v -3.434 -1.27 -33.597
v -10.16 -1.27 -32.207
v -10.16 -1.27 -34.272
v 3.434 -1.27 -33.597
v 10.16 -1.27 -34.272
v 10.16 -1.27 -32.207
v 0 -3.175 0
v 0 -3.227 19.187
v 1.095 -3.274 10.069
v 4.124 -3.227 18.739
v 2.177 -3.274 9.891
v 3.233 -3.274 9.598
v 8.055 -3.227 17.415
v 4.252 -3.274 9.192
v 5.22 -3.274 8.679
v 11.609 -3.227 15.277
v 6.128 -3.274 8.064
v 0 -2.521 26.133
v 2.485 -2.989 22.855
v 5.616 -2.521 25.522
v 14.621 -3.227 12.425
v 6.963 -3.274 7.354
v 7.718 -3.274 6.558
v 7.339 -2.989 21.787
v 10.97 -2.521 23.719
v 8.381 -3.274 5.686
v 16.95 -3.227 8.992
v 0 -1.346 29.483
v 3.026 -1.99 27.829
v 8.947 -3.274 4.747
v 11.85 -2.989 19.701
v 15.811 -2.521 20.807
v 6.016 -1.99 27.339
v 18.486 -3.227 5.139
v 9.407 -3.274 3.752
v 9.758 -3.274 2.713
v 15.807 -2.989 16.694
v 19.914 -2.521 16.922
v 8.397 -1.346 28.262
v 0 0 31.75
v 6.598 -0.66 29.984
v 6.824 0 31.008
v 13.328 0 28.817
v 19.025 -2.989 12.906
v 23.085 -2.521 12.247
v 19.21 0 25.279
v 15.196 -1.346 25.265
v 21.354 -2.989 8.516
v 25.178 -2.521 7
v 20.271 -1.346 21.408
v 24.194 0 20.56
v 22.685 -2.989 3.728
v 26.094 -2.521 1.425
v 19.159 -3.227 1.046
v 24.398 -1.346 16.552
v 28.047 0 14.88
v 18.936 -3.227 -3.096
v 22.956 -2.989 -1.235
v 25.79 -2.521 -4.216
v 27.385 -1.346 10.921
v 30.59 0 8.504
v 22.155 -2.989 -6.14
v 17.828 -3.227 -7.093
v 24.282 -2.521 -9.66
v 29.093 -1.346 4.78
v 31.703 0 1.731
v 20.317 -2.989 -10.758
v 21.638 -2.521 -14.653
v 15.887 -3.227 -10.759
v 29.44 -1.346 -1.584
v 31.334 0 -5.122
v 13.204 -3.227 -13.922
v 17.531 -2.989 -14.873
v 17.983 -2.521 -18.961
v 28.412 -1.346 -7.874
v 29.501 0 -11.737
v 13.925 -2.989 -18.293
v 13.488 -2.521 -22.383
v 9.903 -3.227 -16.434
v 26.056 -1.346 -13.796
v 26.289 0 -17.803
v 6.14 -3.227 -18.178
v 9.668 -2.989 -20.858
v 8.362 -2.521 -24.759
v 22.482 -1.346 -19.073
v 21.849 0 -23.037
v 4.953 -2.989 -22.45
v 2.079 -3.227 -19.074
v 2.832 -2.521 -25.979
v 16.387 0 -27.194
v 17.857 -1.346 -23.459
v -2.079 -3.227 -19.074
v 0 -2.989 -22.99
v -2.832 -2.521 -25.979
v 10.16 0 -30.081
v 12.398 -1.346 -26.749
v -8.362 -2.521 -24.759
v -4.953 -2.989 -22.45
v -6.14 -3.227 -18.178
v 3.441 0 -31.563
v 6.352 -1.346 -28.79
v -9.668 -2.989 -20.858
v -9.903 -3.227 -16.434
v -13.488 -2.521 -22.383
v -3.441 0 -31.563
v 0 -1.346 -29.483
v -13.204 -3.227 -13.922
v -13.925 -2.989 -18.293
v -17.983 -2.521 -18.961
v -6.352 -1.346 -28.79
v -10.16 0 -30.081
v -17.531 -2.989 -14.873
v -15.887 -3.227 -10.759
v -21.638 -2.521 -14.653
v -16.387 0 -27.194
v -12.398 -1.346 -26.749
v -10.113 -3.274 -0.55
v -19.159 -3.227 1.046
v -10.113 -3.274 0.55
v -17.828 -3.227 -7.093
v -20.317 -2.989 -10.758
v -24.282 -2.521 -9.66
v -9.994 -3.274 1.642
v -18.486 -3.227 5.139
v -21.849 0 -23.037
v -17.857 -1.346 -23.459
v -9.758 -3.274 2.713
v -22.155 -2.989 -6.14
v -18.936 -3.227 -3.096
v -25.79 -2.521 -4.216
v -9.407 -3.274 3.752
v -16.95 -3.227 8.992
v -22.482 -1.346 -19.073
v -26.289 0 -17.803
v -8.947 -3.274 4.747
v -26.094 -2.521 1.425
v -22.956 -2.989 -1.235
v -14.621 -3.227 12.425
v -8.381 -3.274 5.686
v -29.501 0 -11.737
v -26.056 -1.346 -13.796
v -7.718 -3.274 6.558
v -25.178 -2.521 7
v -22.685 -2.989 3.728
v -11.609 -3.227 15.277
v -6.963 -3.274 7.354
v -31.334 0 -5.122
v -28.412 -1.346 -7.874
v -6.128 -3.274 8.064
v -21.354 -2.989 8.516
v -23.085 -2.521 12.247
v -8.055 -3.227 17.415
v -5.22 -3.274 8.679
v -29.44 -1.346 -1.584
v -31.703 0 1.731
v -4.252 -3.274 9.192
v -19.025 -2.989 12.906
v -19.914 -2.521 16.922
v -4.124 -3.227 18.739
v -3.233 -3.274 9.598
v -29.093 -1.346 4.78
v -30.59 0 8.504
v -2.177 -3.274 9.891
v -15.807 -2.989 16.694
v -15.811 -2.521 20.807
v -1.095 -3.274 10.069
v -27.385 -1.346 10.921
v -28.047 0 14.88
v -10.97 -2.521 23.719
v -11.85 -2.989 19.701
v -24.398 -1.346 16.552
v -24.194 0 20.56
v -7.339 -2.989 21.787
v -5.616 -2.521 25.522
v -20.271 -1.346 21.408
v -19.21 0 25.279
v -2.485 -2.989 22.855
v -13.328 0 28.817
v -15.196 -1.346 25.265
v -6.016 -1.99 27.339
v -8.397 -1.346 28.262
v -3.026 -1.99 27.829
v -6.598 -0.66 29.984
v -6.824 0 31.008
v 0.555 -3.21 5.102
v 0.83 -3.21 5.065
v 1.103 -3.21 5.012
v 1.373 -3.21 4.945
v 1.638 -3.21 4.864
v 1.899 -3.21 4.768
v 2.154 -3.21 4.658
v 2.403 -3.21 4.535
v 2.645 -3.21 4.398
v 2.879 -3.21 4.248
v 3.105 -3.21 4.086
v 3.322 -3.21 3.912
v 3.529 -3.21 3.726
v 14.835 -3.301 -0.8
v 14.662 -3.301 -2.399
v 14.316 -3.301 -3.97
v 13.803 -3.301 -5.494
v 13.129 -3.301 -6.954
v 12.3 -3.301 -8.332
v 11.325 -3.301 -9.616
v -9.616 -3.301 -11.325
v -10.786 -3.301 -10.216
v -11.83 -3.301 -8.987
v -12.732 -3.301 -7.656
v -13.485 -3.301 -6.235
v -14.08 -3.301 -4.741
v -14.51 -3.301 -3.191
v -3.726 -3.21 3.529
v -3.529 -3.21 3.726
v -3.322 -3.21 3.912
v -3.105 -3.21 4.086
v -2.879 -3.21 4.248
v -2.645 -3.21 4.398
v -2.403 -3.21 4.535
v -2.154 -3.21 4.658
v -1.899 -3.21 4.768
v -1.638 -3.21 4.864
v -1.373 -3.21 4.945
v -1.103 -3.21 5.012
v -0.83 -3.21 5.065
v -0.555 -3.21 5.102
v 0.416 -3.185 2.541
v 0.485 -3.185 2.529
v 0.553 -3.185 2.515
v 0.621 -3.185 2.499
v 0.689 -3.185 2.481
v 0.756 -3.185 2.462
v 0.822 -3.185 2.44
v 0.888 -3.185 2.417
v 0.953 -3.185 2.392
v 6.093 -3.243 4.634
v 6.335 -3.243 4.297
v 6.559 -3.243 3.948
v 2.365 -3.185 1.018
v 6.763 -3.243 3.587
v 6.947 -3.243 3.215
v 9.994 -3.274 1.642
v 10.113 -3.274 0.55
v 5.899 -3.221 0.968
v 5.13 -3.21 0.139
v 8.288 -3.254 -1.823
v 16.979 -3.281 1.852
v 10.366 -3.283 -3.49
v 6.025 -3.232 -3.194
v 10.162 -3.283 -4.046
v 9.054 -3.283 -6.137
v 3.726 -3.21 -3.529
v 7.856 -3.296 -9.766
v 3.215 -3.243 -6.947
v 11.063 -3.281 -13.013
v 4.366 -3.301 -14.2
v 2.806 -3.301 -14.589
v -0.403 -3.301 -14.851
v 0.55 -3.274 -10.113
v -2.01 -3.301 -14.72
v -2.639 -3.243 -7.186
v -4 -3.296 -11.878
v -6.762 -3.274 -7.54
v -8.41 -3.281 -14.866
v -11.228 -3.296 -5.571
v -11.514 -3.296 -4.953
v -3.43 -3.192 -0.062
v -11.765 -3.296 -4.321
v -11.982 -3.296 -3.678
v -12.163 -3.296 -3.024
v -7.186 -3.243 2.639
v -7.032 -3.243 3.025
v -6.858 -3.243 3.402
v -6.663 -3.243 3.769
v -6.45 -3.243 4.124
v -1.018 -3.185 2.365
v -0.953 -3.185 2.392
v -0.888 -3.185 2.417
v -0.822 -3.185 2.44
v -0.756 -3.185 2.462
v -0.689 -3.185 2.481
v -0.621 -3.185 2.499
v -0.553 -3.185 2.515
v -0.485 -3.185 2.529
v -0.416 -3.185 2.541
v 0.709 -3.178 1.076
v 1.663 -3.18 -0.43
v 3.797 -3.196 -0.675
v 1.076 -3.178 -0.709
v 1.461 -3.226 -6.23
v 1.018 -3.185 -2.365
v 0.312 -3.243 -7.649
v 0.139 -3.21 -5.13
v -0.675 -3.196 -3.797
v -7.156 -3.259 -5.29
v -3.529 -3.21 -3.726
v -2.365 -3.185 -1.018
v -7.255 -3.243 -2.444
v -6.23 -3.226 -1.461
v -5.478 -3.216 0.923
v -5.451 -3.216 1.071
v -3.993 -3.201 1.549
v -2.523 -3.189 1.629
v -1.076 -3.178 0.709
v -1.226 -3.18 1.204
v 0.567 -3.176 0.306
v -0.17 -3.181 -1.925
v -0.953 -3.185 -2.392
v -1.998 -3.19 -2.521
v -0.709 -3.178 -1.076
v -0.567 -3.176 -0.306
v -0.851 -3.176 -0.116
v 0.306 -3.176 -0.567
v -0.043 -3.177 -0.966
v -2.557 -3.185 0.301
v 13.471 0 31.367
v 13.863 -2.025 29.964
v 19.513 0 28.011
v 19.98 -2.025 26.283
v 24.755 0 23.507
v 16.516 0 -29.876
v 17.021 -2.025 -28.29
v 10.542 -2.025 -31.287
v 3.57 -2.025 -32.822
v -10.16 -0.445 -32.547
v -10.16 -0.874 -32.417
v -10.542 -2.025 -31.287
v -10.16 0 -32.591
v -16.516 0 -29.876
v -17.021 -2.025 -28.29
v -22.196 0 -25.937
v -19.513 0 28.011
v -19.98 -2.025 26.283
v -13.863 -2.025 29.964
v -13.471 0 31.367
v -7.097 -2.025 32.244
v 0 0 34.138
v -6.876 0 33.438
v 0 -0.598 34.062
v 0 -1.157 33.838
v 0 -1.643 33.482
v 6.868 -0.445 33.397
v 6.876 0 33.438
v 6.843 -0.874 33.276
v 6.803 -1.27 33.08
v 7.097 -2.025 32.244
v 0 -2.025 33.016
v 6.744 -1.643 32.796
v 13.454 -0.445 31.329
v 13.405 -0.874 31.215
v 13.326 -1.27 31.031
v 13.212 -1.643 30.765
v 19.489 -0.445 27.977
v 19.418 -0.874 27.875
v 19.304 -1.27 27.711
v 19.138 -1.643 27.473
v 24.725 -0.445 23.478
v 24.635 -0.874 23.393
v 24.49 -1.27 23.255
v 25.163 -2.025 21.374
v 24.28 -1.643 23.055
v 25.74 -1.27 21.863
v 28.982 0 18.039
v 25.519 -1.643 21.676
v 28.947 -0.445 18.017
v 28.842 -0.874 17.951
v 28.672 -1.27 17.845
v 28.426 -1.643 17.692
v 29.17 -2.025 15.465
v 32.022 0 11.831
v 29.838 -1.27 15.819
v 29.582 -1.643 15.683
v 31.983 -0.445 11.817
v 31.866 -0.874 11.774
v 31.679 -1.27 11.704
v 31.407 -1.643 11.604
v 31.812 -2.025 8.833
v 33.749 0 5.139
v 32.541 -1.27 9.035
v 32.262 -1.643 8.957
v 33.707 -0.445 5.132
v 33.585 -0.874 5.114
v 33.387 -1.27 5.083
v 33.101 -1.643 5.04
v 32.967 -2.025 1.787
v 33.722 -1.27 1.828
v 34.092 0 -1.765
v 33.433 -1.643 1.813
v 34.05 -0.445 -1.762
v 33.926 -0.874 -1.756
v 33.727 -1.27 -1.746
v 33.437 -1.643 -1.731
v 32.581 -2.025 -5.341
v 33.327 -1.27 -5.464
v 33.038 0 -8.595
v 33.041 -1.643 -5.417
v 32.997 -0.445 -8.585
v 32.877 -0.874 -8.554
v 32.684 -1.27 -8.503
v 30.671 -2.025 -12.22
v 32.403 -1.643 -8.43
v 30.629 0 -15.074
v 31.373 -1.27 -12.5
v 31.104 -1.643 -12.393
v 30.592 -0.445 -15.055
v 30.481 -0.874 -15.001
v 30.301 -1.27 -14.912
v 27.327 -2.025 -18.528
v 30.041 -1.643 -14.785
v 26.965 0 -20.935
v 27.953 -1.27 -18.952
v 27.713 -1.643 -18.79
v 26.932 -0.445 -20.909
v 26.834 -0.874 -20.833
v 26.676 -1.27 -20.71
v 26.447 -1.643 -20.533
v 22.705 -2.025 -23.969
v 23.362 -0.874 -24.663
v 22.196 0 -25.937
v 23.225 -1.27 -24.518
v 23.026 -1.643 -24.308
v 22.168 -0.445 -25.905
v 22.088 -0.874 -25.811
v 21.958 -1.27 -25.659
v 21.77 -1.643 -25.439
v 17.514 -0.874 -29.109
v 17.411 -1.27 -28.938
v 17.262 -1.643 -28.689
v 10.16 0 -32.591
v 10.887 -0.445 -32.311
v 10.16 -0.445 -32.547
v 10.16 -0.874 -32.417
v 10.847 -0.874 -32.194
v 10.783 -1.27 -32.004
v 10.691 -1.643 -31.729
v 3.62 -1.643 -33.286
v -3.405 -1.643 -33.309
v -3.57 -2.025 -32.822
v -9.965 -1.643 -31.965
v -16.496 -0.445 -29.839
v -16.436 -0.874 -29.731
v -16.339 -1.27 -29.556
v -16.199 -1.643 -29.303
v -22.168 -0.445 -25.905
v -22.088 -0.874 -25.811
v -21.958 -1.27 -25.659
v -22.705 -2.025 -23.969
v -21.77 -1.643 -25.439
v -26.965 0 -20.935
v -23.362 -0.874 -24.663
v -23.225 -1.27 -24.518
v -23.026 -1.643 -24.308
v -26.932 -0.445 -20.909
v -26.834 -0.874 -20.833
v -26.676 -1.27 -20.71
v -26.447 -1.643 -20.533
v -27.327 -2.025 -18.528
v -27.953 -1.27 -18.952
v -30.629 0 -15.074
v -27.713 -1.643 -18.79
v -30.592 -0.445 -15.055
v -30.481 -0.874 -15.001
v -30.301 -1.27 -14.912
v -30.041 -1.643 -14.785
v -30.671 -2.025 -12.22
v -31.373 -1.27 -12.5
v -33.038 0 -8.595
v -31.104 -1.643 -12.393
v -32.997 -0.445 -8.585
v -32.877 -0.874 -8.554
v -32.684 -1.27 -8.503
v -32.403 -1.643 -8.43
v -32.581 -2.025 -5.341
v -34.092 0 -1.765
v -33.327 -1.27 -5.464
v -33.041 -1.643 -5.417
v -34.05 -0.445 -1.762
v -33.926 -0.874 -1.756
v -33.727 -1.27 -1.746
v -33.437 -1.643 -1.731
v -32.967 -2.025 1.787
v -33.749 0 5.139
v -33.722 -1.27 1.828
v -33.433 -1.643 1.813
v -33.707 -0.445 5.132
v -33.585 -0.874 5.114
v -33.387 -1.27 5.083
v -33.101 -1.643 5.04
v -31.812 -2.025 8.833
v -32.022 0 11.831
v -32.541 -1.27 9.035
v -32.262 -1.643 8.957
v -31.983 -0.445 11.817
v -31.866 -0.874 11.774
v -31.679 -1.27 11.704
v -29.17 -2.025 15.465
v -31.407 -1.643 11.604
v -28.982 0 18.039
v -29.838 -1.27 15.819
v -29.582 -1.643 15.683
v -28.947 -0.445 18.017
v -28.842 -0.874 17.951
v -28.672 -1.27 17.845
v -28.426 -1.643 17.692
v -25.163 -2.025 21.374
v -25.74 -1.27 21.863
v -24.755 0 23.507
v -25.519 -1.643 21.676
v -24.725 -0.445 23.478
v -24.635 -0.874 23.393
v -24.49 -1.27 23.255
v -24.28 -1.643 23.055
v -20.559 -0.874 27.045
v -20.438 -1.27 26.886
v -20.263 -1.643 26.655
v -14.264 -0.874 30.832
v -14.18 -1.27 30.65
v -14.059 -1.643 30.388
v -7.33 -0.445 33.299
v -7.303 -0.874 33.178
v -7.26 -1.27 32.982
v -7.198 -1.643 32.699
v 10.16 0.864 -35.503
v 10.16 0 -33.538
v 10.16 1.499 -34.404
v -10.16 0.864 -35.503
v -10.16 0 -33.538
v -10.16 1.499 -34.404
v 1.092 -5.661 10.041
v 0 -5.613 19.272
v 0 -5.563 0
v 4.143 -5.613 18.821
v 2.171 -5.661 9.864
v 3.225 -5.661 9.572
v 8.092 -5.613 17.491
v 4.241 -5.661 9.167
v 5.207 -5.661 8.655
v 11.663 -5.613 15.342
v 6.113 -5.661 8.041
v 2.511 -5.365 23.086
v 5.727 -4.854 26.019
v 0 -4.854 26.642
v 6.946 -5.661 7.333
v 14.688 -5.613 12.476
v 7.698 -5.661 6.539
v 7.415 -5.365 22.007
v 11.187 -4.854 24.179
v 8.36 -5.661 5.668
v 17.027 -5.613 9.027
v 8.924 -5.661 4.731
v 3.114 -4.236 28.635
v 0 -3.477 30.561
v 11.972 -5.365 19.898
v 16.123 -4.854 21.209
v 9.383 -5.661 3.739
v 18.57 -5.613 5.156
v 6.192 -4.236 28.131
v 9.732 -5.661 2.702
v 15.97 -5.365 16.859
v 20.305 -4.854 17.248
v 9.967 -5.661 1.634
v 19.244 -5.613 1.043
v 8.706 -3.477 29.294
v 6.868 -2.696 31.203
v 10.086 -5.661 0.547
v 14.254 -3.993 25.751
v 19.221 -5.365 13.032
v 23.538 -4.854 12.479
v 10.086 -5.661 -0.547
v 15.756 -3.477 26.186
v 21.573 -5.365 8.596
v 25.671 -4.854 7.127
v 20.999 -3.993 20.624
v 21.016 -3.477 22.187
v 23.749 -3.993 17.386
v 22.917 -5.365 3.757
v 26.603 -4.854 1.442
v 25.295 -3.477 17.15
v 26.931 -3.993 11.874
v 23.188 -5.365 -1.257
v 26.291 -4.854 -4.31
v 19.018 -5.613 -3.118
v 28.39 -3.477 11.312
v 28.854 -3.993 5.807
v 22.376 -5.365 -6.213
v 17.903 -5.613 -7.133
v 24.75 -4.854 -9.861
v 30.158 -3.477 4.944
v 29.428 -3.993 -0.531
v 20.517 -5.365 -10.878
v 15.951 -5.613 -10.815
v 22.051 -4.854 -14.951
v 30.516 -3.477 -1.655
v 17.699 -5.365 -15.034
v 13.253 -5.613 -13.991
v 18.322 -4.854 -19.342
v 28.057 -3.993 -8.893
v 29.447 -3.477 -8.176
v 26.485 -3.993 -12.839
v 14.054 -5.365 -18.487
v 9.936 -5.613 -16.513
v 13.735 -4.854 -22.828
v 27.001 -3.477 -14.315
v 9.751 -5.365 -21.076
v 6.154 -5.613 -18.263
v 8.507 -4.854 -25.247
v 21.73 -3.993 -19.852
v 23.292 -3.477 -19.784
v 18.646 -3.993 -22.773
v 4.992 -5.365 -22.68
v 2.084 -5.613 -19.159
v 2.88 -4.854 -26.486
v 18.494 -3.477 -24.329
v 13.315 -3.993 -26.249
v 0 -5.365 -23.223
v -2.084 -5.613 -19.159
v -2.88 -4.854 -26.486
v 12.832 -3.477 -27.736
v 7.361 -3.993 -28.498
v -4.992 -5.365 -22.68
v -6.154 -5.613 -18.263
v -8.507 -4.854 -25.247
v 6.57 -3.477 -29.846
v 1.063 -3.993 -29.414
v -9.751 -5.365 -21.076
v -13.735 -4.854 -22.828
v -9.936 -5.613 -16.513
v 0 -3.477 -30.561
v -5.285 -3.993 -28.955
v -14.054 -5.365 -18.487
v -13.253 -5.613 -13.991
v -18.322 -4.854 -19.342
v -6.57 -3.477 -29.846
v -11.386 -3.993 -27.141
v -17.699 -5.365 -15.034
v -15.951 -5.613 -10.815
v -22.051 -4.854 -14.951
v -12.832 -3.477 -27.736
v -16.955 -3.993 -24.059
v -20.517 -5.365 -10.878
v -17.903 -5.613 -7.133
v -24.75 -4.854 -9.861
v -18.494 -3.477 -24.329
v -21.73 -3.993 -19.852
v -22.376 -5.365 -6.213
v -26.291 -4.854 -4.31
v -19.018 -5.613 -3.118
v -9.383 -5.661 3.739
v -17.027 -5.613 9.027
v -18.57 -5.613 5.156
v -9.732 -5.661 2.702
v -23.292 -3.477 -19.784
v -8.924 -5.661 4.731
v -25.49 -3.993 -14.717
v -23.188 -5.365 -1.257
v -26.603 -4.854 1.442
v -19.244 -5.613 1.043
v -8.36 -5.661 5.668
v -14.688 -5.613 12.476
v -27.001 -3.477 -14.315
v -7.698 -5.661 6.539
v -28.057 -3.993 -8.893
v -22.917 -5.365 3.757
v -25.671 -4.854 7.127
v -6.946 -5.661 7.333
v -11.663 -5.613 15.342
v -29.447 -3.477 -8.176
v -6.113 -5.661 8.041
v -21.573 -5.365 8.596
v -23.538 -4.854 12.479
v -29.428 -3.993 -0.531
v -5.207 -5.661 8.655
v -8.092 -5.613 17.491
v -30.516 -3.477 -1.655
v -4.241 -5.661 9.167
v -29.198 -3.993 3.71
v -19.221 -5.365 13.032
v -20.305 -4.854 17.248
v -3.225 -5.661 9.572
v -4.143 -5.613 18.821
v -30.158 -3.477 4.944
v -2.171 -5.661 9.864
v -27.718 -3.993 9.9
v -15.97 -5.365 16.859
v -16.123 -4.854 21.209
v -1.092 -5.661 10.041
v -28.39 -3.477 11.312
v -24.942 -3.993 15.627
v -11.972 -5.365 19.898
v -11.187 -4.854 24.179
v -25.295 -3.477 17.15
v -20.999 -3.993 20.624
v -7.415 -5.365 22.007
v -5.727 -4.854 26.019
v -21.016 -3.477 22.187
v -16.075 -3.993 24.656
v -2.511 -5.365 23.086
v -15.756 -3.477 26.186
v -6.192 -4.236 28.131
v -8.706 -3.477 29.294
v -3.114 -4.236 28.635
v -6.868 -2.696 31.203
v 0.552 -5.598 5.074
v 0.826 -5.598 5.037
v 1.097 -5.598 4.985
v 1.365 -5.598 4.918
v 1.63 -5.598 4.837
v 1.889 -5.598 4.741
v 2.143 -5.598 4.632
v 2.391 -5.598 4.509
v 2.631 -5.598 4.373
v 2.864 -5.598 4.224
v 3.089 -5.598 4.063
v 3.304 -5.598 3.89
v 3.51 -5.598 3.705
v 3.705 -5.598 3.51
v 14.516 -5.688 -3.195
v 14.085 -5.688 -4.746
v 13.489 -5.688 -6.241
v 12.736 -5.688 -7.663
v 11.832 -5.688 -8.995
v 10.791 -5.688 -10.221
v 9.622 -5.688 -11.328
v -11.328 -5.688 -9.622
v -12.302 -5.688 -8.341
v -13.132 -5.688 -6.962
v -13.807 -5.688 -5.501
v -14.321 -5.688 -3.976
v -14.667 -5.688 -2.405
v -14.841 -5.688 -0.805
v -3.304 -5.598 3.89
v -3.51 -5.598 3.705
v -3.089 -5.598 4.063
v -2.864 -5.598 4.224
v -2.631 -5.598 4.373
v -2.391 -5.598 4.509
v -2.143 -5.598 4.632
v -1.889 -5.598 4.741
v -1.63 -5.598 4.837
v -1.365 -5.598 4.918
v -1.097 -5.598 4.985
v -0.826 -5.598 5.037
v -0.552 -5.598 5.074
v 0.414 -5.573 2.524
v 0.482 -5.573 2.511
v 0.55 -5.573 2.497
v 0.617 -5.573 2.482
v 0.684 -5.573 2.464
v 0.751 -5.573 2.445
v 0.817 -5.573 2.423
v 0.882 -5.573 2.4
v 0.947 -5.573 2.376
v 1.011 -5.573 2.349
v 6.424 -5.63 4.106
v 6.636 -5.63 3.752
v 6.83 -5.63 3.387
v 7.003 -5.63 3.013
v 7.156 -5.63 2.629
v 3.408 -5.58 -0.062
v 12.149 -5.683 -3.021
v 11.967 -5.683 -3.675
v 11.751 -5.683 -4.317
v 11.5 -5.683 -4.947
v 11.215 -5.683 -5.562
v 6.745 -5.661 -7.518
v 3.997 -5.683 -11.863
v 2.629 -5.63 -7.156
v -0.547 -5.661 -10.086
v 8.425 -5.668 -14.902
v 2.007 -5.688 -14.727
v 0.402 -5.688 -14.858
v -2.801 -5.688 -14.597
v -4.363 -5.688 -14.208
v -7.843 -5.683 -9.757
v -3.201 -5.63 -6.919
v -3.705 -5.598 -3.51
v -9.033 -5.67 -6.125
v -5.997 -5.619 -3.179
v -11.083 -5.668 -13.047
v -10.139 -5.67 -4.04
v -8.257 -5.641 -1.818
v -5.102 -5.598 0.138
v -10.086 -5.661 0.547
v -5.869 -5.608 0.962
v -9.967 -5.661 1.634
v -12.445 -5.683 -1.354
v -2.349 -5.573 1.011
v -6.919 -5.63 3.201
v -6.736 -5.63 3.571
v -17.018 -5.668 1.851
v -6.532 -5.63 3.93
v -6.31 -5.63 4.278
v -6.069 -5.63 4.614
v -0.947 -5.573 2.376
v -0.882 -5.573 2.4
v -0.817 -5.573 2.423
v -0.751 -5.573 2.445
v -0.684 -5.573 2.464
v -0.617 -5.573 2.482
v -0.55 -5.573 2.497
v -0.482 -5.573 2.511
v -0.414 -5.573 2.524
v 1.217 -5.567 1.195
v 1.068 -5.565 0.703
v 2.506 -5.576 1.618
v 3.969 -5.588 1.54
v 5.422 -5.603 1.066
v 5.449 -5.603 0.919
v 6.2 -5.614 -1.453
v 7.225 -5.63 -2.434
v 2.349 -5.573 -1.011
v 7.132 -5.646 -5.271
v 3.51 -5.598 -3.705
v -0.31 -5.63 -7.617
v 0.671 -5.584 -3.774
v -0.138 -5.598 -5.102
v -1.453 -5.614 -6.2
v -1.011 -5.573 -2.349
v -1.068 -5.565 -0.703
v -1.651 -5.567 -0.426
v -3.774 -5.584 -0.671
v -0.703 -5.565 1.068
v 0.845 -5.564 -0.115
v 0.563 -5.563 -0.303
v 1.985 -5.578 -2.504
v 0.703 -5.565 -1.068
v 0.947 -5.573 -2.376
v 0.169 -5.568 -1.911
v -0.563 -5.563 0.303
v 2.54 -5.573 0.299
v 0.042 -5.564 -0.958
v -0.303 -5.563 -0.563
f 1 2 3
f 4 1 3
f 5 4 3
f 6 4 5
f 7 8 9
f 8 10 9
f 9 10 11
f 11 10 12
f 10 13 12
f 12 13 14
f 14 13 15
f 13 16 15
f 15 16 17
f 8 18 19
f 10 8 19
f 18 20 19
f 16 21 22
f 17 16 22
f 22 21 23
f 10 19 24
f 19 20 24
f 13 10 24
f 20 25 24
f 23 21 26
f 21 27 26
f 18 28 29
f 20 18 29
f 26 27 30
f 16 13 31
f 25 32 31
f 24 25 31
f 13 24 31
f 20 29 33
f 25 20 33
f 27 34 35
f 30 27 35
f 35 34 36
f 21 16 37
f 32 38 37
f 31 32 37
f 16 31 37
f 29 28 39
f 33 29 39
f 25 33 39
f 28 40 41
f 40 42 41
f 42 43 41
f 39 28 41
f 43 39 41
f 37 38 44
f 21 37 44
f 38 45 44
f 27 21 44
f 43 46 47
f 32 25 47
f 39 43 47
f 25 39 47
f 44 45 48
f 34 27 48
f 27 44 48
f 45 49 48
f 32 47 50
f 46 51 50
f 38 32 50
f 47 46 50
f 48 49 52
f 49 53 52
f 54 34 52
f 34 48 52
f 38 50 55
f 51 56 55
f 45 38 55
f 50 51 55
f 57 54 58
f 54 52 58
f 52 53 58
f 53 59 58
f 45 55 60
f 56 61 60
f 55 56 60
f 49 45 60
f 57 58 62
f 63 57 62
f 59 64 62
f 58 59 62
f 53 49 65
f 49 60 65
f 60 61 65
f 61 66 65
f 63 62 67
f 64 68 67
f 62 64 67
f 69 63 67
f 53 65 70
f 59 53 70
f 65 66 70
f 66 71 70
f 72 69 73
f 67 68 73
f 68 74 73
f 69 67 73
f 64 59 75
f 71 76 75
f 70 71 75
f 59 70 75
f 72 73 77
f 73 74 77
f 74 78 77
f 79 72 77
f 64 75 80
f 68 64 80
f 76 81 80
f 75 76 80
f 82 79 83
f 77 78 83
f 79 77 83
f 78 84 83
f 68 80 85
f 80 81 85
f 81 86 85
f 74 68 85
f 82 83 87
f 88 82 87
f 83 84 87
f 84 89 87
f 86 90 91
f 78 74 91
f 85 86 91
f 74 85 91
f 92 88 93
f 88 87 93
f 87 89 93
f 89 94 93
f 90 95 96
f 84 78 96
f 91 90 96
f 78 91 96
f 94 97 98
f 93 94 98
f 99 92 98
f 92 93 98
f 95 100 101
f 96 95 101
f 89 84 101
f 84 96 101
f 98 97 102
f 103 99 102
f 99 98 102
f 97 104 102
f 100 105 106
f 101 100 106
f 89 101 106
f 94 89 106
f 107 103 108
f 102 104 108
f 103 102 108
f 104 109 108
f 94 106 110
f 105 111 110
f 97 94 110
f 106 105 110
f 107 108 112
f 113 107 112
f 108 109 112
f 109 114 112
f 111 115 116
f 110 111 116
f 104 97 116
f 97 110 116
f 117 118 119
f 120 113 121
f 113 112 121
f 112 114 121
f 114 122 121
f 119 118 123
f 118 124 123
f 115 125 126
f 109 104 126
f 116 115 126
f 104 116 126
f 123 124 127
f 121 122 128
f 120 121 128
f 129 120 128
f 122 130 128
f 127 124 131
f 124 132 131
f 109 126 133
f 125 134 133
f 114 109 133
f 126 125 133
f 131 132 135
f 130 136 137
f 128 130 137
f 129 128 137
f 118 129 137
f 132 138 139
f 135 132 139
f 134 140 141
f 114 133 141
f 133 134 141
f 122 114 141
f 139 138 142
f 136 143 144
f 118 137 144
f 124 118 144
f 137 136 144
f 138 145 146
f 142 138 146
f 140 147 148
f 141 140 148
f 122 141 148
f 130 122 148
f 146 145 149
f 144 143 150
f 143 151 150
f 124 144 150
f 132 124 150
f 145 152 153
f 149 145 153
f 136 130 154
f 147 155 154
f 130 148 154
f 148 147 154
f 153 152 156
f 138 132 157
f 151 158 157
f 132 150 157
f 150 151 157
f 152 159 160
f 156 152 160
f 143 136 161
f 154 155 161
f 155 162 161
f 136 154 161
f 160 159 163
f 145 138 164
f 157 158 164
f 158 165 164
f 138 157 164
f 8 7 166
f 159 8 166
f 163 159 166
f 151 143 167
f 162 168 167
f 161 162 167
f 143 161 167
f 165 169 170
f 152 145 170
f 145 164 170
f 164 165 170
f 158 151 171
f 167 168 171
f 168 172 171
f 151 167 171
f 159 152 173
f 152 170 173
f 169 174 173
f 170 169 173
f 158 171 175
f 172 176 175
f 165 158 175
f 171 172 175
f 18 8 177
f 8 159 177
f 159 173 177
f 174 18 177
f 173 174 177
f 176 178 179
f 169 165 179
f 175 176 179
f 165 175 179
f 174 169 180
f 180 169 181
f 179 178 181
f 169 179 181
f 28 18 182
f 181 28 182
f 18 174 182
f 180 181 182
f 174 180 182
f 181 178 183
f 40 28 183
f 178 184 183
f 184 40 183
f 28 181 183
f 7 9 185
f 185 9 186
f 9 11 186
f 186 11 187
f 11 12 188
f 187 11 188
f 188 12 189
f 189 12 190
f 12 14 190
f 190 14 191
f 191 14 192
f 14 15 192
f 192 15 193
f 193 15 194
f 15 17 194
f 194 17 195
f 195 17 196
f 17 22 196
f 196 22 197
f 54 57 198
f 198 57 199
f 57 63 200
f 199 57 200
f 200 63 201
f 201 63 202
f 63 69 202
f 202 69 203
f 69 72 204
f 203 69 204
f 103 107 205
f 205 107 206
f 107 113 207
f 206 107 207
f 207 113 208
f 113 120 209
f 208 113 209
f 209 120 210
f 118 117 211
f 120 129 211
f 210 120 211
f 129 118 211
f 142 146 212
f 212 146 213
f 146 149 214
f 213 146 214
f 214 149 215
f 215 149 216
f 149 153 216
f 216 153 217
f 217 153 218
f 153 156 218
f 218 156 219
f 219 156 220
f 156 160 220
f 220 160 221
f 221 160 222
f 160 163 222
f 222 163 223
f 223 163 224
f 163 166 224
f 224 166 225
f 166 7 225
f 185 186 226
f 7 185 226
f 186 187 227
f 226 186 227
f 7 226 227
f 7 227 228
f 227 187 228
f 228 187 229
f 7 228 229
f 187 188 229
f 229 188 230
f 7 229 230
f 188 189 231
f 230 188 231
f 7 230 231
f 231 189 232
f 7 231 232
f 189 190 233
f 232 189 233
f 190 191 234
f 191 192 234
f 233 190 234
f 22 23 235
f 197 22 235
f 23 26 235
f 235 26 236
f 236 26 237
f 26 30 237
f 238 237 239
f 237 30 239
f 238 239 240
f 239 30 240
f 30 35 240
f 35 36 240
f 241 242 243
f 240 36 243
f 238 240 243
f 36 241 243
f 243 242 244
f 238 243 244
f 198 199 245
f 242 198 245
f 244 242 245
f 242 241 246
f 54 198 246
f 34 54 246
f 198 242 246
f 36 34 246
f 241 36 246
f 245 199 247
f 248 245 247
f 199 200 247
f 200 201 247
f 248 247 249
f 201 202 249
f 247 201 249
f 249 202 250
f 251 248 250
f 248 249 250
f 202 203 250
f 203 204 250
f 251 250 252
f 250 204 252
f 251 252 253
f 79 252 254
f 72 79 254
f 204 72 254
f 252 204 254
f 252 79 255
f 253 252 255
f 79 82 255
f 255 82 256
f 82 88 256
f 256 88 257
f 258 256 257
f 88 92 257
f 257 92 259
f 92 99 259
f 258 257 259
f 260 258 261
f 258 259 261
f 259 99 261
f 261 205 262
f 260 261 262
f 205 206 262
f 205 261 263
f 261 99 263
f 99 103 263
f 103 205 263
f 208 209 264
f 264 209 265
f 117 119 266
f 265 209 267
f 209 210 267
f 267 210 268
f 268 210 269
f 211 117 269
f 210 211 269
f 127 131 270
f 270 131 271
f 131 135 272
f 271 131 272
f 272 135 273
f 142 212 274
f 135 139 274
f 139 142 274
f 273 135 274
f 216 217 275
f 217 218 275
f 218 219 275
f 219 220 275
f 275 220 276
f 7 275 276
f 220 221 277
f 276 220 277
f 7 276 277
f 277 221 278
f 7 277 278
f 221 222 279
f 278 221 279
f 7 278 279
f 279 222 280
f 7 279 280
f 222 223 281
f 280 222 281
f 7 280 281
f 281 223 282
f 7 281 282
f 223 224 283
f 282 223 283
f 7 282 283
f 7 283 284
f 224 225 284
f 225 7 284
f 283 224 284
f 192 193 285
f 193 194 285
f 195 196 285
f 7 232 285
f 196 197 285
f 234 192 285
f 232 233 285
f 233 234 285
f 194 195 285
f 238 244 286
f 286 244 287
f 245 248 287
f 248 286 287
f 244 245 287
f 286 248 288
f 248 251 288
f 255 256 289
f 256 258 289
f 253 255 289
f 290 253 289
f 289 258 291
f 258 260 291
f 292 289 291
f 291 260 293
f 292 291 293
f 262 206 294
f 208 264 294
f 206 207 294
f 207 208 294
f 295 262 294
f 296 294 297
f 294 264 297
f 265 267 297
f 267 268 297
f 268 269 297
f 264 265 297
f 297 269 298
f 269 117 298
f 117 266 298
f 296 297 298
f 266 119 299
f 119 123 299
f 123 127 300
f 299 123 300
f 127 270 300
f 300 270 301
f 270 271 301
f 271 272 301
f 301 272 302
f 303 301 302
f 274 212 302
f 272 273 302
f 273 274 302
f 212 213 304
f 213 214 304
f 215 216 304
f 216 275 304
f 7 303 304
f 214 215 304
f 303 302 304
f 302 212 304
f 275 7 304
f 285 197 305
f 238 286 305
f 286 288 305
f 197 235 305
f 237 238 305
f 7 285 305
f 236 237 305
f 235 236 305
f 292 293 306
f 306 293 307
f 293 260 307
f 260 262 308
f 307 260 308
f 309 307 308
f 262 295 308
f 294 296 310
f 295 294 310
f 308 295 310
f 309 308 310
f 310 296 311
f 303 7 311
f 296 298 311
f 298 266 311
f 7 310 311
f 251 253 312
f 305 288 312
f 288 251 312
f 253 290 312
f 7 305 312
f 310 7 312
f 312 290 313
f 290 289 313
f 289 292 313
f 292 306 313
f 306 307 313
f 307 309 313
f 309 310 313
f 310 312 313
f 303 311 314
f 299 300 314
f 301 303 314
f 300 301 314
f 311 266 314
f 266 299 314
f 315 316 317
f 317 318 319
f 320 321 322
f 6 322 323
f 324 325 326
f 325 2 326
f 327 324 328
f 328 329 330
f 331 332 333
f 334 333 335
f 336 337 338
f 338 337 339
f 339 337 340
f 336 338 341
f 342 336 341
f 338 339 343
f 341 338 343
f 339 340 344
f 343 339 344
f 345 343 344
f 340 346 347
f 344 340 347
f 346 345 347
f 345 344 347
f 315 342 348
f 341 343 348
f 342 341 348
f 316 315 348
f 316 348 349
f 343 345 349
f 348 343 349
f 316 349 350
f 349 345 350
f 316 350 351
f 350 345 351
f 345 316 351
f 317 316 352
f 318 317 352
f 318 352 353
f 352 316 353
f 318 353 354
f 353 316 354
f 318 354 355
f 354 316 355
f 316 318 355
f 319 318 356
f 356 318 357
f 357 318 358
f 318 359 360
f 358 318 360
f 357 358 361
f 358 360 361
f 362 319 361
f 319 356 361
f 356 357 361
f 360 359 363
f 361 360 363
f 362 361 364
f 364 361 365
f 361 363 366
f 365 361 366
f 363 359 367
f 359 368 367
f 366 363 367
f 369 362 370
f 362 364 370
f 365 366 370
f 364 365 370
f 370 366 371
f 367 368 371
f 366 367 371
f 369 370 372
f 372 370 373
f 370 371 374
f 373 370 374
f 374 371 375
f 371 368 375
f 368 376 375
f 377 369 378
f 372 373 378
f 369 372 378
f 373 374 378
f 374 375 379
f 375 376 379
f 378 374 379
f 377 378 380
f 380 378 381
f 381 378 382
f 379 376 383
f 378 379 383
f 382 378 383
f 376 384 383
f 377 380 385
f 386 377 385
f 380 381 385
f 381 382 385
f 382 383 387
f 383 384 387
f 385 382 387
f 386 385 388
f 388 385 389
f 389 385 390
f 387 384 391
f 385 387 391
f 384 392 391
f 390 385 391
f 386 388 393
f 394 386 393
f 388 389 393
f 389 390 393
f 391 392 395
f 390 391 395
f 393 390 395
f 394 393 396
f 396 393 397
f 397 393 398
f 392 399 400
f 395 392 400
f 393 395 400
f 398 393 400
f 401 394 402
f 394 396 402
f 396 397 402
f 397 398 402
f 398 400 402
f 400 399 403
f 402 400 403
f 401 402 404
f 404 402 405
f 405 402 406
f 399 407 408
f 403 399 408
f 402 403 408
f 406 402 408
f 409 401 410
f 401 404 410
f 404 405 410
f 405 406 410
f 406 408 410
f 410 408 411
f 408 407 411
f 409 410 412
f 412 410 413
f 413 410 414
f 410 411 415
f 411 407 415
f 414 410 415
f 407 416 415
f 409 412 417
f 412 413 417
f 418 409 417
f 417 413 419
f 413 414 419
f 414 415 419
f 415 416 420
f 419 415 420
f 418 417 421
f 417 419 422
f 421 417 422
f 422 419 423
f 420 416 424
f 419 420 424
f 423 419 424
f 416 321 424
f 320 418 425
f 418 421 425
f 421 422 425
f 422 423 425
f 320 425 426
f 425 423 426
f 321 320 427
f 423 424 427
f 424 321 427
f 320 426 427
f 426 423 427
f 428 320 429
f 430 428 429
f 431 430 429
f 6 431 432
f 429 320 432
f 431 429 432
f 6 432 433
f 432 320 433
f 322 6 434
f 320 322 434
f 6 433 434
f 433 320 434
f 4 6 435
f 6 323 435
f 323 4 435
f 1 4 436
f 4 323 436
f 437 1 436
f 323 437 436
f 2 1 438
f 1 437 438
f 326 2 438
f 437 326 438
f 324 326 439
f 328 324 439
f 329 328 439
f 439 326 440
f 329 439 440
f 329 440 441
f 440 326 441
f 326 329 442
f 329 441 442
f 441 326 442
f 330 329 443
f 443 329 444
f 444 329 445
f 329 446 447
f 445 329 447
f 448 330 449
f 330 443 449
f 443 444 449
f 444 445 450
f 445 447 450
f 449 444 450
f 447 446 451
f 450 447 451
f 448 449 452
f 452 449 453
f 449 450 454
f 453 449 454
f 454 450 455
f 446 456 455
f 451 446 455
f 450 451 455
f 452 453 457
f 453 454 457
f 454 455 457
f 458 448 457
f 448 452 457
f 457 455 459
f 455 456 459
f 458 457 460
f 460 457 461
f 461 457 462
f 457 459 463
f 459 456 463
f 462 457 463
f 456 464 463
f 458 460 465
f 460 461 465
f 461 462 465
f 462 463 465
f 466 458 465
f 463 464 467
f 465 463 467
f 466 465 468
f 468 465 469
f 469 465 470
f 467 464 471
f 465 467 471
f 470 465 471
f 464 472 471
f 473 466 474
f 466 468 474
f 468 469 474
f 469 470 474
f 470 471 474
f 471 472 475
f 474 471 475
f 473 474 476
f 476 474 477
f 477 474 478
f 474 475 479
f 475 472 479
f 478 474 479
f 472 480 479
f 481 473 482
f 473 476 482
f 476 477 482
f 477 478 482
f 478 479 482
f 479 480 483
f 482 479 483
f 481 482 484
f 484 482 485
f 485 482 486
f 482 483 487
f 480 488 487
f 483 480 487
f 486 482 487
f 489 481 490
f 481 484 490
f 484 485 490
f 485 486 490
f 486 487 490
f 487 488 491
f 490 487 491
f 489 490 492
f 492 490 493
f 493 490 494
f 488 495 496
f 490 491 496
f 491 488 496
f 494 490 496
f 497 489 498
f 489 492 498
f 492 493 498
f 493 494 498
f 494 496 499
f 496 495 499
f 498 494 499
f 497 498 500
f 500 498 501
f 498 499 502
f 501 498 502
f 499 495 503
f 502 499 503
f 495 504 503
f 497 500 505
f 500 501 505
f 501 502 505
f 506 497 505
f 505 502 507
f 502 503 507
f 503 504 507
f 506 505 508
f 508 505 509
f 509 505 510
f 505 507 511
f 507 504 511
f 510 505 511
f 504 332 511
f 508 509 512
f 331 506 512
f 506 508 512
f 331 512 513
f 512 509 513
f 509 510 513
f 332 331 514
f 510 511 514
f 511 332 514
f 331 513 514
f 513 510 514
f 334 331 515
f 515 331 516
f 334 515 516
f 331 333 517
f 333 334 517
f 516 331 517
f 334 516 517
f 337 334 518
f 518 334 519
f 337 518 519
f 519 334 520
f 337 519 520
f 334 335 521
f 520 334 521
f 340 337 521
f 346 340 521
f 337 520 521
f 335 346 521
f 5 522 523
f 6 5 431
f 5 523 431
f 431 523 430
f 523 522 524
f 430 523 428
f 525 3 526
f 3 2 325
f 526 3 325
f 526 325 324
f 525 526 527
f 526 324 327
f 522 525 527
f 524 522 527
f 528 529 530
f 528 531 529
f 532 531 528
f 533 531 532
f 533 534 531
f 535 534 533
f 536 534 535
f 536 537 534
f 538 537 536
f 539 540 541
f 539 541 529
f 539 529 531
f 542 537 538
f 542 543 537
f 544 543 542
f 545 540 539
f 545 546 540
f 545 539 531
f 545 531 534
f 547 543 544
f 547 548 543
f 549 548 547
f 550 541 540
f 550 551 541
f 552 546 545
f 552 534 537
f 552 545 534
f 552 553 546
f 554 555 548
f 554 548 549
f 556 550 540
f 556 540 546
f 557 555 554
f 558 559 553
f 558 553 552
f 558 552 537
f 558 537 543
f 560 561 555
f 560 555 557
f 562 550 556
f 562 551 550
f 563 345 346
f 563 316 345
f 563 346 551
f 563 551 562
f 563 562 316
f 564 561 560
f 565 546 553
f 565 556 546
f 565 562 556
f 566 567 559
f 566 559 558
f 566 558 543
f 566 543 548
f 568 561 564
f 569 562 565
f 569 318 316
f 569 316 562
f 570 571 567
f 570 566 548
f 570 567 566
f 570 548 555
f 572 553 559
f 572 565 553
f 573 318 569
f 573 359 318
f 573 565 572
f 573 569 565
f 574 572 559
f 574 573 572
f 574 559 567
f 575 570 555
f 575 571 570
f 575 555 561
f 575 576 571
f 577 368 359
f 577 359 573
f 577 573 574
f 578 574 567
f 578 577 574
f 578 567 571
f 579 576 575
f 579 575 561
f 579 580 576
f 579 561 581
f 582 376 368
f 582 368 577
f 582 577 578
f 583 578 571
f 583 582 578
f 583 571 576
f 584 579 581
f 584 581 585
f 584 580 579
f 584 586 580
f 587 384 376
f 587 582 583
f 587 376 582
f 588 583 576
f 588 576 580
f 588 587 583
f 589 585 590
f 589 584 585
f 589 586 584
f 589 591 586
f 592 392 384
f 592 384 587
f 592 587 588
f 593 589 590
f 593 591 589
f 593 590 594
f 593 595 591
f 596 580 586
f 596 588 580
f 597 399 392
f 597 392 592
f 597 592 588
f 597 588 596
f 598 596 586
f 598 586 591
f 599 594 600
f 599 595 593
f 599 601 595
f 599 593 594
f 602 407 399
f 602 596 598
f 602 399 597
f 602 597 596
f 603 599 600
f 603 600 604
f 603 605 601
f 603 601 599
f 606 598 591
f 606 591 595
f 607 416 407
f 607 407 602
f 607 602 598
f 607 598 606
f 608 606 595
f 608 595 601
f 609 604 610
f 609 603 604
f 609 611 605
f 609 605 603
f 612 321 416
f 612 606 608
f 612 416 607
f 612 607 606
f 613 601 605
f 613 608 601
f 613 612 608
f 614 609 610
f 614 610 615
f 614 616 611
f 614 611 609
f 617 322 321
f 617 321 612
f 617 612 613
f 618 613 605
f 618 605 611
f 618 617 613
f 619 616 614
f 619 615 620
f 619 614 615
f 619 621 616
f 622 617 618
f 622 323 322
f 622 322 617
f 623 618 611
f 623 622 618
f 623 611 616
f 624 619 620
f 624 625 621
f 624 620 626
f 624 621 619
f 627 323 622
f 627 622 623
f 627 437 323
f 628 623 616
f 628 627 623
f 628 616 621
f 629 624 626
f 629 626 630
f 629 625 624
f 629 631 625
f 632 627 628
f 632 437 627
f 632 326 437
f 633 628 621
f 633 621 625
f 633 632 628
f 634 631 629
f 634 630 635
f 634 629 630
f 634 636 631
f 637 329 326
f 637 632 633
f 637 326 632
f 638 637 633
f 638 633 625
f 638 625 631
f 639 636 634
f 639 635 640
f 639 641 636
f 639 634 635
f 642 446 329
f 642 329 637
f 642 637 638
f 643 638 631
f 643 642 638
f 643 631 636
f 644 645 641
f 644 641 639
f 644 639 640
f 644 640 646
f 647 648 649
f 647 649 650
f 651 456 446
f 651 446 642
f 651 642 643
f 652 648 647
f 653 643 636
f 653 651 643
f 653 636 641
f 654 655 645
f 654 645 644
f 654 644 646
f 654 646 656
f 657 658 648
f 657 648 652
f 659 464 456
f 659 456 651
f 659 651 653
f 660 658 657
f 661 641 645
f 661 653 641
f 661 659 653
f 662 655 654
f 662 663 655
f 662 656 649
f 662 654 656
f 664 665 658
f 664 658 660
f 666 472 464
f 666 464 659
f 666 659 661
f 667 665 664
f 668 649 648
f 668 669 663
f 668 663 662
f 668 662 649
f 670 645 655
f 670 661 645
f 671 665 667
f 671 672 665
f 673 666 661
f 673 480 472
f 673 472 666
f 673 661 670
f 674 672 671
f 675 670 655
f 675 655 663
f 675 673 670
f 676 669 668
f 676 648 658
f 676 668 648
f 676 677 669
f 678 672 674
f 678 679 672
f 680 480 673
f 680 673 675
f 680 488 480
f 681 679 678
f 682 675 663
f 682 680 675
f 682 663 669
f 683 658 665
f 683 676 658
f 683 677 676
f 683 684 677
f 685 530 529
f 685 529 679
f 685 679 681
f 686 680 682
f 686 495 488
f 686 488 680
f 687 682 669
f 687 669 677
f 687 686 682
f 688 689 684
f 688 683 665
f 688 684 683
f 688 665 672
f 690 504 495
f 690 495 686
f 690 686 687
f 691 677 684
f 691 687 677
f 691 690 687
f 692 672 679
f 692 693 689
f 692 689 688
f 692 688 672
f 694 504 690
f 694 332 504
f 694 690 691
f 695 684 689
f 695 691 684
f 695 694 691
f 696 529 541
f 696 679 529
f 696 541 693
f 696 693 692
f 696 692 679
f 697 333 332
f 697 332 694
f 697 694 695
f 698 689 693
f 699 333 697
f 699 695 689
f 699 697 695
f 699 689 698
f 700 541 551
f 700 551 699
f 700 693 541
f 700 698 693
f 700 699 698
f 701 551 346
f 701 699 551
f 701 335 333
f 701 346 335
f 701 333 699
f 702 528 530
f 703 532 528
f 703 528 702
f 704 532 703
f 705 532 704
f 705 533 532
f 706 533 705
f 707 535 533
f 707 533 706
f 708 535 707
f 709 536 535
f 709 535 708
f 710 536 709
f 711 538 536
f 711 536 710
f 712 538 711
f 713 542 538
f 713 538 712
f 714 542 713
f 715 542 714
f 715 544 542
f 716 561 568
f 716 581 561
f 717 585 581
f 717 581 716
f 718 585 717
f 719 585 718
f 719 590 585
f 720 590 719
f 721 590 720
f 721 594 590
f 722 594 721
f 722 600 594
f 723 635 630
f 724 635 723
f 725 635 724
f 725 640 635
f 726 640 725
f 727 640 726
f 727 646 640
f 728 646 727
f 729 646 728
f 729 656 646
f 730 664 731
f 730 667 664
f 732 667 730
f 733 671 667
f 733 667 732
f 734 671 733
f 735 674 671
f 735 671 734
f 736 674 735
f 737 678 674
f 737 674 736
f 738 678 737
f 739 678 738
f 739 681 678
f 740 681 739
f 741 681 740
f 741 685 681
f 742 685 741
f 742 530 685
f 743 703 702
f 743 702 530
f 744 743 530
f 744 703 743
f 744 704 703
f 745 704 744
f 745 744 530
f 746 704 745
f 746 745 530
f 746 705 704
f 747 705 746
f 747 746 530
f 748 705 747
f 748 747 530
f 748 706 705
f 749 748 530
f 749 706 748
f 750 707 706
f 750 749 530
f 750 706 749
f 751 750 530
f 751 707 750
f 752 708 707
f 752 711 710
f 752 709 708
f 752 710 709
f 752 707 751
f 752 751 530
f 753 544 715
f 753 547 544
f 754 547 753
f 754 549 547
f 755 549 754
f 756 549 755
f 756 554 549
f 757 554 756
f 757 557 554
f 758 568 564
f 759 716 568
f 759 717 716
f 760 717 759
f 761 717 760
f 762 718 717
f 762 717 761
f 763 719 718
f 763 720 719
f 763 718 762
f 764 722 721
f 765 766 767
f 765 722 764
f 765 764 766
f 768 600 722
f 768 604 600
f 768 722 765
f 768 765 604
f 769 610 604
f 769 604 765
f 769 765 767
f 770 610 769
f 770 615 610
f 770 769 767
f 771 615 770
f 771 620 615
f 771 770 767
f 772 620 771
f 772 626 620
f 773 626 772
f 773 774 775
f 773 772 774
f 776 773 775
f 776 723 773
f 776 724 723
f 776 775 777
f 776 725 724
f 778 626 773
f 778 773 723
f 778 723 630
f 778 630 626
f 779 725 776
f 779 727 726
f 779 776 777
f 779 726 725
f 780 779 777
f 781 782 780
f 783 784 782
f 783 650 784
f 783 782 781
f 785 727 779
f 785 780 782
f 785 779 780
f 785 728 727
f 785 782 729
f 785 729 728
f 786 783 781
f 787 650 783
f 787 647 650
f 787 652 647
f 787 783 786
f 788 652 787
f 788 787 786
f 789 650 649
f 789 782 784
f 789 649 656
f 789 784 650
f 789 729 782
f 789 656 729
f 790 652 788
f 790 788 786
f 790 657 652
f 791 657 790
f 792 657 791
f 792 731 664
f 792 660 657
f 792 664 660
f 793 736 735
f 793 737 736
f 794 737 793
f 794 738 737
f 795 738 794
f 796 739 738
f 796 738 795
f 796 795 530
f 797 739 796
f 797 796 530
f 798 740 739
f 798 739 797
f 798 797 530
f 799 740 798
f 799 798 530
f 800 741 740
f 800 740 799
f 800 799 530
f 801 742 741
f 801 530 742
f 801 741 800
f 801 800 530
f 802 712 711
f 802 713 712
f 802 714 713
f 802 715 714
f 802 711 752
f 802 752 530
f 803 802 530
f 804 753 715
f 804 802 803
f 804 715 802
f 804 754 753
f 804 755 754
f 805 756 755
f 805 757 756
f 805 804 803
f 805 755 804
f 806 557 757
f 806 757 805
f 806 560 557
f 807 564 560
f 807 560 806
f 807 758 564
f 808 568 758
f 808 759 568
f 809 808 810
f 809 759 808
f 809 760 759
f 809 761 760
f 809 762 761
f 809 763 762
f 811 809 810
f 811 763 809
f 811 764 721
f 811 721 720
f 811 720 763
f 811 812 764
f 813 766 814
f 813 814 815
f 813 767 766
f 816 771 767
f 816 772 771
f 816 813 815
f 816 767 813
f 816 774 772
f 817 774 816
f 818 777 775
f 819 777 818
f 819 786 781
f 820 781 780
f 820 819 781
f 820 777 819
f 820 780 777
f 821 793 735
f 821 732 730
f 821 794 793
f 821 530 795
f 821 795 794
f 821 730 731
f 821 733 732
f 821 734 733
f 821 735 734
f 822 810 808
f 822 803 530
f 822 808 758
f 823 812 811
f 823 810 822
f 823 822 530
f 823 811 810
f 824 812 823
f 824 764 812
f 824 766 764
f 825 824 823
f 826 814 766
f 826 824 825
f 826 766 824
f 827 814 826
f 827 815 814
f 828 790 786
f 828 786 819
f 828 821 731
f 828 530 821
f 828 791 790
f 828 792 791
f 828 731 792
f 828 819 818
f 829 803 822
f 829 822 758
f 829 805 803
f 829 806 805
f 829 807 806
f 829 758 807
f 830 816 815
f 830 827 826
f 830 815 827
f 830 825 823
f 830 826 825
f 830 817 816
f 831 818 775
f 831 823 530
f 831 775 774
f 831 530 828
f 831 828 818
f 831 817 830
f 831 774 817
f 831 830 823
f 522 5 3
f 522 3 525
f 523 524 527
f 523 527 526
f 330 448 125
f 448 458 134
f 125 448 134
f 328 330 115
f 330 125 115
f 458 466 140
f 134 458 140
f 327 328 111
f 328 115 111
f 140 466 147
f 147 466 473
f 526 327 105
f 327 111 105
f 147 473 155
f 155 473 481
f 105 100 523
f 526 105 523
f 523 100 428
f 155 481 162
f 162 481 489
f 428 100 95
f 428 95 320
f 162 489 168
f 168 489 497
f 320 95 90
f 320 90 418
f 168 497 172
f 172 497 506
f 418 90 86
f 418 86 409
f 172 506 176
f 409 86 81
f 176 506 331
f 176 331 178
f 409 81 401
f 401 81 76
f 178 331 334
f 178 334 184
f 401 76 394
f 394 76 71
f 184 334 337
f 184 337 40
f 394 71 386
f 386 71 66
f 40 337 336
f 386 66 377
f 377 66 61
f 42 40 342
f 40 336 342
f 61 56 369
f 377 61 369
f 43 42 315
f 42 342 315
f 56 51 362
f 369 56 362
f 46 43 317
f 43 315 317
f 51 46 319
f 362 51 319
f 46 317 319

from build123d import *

# Parameters (mm, degrees)
F3_DEPTH = 1.27
F5_DEPTH = 20.32


# Not quite as in the source:
# - the dataset's text gives a spline's control points without its knots; the knots are read off the source's solid


with BuildPart() as f1:
    # F0 (on Right) → F1 (revolve)
    with BuildSketch(Plane.YZ):
        with BuildLine():
            Line((-5.5626, 0), (-3.175, 0))
            add(Edge.make_bspline(
                [(-3.175, 0), (-3.175, 10.541), (-4.0239762357, 25.9589322905), (-0.7943624519, 30.4792560231), (0, 31.75)],
                knots=[0, 0, 0, 0, 0.6813666235, 1, 1, 1, 1], degree=3))
            Line((0, 31.75), (0, 34.1376))
            ThreePointArc((0, 34.1376), (-1.1573462176, 33.8383446776), (-2.0245751497, 33.015594415))
            add(Edge.make_bspline(
                [(-5.5626, 0), (-5.5626, 1.9177725401), (-5.6012595175, 5.763256361), (-5.6850380944, 11.3740945743), (-5.7026900101, 16.6481342132), (-5.5838020802, 20.622627977), (-5.3557319657, 23.480741035), (-5.1437190397, 25.1246883423), (-4.9215103036, 26.3507670581), (-4.7229256392, 27.2307815663), (-4.4932831777, 28.052608441), (-4.1541081797, 29.0674517161), (-3.6792176979, 30.1931579589), (-2.8749355371, 31.7097687785), (-2.3121014901, 32.5556376731), (-2.0245751497, 33.015594415)],
                knots=[0, 0, 0, 0, 0.1249999999, 0.2499999998, 0.3749999996, 0.4999999995, 0.5624999995, 0.6249999994, 0.6562499994, 0.6874999993, 0.7187499993, 0.7499999993, 0.8124999992, 0.8749999991, 0.999999999, 0.999999999, 0.999999999, 0.999999999], degree=3))
        make_face()
    revolve(axis=Axis((0, -4.3688, 0), (0, 1, 0)))

    # F2 (on Front) → F3 (join)
    with BuildSketch(Plane.XZ):
        with BuildLine():
            Line((10.16, -34.2715069771), (10.16, -30.0805069771))
            ThreePointArc((10.16, -30.0805069771), (0, -31.75), (-10.16, -30.0805069771))
            Line((-10.16, -30.0805069771), (-10.16, -34.2715069771))
            Line((-10.16, -34.2715069771), (10.16, -34.2715069771))
        make_face()
    extrude(amount=F3_DEPTH)

    # F4 (on face) → F5 (join)
    with BuildSketch(Plane.YZ.offset(10.16)):
        Polygon((-0.635, -33.1716547143), (-1.27, -34.2715069771), (0.8637133898, -35.5034069771), (1.4987133898, -34.4035547143), align=None)
    extrude(amount=-F5_DEPTH)


solid = f1.part
